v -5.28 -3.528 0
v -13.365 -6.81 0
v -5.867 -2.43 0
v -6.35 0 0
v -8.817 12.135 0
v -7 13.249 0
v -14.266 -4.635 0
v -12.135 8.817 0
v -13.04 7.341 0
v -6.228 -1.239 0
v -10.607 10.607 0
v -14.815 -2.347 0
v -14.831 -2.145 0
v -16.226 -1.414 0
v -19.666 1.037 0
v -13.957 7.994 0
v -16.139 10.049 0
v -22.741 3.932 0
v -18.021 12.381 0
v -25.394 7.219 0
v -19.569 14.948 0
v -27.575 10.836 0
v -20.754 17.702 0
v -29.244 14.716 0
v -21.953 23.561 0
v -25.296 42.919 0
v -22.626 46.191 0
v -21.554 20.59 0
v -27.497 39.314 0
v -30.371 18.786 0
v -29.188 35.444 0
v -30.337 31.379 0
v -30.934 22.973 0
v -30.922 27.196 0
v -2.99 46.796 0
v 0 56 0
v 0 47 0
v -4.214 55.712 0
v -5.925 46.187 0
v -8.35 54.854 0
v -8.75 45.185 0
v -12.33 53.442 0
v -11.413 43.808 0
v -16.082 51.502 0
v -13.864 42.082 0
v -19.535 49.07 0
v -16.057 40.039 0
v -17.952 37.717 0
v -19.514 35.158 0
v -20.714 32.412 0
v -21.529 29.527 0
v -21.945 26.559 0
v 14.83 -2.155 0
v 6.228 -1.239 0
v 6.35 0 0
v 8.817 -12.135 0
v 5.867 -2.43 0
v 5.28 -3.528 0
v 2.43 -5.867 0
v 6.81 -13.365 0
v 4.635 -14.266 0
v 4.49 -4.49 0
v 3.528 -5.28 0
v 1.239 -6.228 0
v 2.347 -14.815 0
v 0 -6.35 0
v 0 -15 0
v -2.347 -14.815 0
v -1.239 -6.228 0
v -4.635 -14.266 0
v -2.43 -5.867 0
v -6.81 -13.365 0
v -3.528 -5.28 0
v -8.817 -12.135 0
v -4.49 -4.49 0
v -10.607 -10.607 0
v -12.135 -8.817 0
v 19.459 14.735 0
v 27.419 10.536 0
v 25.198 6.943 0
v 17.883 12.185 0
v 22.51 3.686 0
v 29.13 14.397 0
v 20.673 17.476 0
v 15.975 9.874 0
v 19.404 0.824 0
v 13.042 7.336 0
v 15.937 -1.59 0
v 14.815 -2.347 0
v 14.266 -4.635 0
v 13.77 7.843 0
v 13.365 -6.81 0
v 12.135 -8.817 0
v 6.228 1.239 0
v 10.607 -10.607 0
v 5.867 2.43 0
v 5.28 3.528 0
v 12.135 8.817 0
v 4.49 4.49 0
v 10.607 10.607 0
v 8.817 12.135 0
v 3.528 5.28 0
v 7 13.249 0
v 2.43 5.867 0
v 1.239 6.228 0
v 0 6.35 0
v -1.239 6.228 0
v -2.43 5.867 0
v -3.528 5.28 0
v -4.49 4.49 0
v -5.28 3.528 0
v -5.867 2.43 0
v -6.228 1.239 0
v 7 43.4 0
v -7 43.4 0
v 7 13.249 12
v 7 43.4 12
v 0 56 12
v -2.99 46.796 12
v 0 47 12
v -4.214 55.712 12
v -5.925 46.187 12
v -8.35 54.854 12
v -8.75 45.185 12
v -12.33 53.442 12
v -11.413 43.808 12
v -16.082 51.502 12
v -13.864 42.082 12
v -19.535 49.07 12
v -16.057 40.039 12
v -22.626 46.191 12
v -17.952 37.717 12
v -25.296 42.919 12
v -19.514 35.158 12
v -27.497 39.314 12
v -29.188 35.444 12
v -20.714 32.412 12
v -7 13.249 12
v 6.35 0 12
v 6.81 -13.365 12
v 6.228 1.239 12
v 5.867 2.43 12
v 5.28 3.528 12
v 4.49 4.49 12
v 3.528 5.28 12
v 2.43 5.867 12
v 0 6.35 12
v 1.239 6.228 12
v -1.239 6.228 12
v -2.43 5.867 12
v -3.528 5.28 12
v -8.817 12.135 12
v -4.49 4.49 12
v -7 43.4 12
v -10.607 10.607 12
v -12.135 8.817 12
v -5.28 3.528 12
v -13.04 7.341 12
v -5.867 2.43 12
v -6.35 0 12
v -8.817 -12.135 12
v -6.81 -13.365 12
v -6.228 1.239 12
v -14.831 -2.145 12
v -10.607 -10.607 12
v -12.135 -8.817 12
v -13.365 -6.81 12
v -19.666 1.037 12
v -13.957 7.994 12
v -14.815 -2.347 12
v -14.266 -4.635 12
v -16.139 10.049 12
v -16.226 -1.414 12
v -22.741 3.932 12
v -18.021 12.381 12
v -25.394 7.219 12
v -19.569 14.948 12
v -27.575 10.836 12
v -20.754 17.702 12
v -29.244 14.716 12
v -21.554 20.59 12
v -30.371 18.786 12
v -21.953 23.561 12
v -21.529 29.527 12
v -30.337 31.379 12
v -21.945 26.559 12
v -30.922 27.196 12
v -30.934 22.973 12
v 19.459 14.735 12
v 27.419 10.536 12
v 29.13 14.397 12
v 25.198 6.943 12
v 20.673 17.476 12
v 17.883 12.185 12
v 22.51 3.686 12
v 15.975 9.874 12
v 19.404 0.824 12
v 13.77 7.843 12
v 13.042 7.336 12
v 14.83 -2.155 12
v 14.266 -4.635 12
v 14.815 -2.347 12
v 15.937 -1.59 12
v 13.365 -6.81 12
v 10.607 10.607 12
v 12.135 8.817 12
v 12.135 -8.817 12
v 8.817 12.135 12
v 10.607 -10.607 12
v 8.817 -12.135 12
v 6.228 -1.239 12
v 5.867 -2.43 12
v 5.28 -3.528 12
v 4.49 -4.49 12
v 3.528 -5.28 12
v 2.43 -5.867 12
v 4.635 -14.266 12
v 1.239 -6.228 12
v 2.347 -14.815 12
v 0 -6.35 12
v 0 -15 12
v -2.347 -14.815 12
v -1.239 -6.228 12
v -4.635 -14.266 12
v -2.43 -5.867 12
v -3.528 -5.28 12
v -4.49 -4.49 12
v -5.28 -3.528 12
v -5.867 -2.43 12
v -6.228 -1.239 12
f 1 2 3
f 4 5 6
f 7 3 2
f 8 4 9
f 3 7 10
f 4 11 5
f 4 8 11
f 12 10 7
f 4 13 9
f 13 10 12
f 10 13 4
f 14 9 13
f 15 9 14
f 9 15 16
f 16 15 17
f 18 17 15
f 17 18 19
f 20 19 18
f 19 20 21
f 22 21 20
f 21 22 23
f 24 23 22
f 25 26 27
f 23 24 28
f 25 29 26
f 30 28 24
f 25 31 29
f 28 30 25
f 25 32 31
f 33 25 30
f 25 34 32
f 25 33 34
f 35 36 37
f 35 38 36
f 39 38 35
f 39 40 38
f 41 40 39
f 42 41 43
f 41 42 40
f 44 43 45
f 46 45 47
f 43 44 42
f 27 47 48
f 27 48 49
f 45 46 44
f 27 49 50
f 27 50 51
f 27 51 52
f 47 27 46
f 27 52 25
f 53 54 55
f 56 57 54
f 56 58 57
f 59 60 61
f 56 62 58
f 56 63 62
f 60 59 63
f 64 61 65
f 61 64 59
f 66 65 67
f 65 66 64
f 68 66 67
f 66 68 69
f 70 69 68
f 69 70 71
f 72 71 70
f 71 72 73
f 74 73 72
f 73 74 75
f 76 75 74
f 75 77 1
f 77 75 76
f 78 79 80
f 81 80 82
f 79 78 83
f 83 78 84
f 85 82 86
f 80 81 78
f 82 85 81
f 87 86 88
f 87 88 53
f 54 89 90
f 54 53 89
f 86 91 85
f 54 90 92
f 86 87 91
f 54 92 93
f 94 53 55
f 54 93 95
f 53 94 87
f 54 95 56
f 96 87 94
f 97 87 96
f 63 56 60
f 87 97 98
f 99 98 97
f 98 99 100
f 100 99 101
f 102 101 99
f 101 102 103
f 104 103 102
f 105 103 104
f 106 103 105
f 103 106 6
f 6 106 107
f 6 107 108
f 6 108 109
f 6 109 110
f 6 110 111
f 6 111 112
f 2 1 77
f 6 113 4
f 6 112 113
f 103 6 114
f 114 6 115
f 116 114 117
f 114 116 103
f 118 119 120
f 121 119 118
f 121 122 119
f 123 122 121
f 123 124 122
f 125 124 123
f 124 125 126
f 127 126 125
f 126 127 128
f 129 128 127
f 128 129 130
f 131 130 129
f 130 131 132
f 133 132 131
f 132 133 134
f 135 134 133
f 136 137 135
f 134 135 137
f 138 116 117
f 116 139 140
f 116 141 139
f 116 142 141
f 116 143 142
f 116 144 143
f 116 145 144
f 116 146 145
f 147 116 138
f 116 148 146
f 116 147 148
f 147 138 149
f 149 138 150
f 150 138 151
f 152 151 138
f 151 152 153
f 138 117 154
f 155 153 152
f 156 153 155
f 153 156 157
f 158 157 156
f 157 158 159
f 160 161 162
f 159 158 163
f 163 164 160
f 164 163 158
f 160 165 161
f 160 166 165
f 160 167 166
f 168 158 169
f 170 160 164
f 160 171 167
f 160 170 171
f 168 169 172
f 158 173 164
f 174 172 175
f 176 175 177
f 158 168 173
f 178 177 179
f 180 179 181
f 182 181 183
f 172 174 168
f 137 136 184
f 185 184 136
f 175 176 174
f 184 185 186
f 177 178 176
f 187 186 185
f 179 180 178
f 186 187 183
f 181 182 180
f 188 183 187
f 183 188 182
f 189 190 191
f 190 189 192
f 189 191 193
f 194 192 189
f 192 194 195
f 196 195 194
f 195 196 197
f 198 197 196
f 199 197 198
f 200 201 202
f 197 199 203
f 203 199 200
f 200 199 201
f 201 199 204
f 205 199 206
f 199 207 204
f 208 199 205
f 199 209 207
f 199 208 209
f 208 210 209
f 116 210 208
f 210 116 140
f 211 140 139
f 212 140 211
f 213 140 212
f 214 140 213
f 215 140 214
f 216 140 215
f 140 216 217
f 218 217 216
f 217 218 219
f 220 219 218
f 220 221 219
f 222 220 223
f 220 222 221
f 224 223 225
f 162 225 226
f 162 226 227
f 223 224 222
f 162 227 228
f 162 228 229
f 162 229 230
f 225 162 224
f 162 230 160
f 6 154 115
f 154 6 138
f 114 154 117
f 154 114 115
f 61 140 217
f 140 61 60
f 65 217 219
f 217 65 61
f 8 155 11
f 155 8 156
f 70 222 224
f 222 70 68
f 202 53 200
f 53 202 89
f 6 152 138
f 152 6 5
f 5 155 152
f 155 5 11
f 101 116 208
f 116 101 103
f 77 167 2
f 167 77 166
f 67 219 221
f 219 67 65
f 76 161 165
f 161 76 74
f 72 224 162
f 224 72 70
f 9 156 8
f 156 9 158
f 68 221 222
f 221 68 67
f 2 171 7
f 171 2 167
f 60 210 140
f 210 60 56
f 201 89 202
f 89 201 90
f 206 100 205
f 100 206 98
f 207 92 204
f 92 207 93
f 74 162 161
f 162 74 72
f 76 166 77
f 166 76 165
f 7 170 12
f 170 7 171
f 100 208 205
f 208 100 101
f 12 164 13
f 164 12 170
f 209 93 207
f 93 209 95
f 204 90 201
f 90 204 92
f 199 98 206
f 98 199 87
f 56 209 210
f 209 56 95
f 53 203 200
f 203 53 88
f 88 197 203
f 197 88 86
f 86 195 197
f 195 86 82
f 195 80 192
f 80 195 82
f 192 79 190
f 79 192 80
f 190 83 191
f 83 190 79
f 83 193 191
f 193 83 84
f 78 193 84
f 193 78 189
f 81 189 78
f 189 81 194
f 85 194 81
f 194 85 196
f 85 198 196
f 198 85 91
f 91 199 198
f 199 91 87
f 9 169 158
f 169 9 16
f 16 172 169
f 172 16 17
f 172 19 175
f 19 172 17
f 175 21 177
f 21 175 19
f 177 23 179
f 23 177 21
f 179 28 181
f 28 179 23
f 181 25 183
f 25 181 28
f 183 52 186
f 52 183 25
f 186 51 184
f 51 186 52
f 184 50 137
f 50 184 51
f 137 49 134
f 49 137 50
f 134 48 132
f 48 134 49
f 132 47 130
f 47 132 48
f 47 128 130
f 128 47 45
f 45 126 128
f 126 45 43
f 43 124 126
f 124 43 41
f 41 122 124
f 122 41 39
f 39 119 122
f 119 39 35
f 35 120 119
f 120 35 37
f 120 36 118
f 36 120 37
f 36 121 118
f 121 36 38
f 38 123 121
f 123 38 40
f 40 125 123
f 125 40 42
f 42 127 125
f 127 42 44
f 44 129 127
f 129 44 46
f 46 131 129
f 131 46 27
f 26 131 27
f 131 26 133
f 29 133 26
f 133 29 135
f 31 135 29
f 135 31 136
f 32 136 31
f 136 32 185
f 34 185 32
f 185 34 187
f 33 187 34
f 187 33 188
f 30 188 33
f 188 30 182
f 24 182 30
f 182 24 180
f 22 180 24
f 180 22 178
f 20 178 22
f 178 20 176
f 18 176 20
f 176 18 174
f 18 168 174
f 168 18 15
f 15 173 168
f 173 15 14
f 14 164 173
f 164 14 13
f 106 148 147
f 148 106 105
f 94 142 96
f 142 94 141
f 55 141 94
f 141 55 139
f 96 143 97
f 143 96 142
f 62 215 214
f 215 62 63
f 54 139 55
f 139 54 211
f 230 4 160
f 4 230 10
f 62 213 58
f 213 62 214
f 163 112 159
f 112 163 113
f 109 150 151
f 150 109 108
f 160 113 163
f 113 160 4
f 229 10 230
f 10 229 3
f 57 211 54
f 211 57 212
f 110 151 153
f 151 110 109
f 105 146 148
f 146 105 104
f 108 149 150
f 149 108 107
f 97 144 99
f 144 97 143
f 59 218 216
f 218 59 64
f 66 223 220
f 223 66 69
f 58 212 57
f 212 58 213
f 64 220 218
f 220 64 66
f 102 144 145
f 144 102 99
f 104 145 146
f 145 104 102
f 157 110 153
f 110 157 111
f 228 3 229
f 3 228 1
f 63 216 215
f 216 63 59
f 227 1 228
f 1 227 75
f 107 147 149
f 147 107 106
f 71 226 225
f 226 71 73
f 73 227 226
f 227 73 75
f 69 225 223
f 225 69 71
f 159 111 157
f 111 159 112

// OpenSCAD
$fn = 32;

// ----------------------------------------------------------------------
// Hook: 50 mm shank into a 22 mm curl, 12 mm thick
// ----------------------------------------------------------------------

// --- parameters (mm) ---
shank_len = 50;           // shank length from the boss centre
shank_w = 14;             // shank width
boss_d = 30;              // boss diameter
bore_d = 12.7;            // boss bore
curl_in = 22;             // curl inner radius
curl_out = 31;            // curl outer radius
curl_sweep = 250;         // curl sweep angle
hook_t = 12;              // hook thickness

shank_profile = [[-7, 43.4], [7, 43.4], [7, 13], [-7, 13]];
boss_profile = [[15, 0], [14.815, 2.347], [14.266, 4.635], [13.365, 6.81], [12.135, 8.817], [10.607, 10.607], [8.817, 12.135], [6.81, 13.365], [4.635, 14.266], [2.347, 14.815], [0, 15], [-2.347, 14.815], [-4.635, 14.266], [-6.81, 13.365], [-8.817, 12.135], [-10.607, 10.607], [-12.135, 8.817], [-13.365, 6.81], [-14.266, 4.635], [-14.815, 2.347], [-15, 0], [-14.815, -2.347], [-14.266, -4.635], [-13.365, -6.81], [-12.135, -8.817], [-10.607, -10.607], [-8.817, -12.135], [-6.81, -13.365], [-4.635, -14.266], [-2.347, -14.815], [0, -15], [2.347, -14.815], [4.635, -14.266], [6.81, -13.365], [8.817, -12.135], [10.607, -10.607], [12.135, -8.817], [13.365, -6.81], [14.266, -4.635], [14.815, -2.347]];
curl_profile = [[0, 56], [-4.214, 55.712], [-8.35, 54.854], [-12.33, 53.442], [-16.082, 51.502], [-19.535, 49.07], [-22.626, 46.191], [-25.296, 42.919], [-27.497, 39.314], [-29.188, 35.444], [-30.337, 31.379], [-30.922, 27.196], [-30.934, 22.973], [-30.371, 18.786], [-29.244, 14.716], [-27.575, 10.836], [-25.394, 7.219], [-22.741, 3.932], [-19.666, 1.037], [-16.226, -1.414], [-12.485, -3.375], [-8.512, -4.808], [-4.381, -5.689], [-0.169, -6], [4.046, -5.735], [8.187, -4.899], [12.175, -3.509], [15.937, -1.59], [19.404, 0.824], [22.51, 3.686], [25.198, 6.943], [27.419, 10.536], [29.13, 14.397], [20.673, 17.476], [19.459, 14.735], [17.883, 12.185], [15.975, 9.874], [13.77, 7.843], [11.31, 6.13], [8.64, 4.768], [5.81, 3.781], [2.872, 3.188], [-0.12, 3], [-3.109, 3.221], [-6.041, 3.846], [-8.86, 4.863], [-11.515, 6.254], [-13.957, 7.994], [-16.139, 10.049], [-18.021, 12.381], [-19.569, 14.948], [-20.754, 17.702], [-21.554, 20.59], [-21.953, 23.561], [-21.945, 26.559], [-21.529, 29.527], [-20.714, 32.412], [-19.514, 35.158], [-17.952, 37.717], [-16.057, 40.039], [-13.864, 42.082], [-11.413, 43.808], [-8.75, 45.185], [-5.925, 46.187], [-2.99, 46.796], [0, 47]];

difference() {
  union() {
    /* three overlapping outlines: shank, boss and the smooth curl */
    linear_extrude(height = hook_t) polygon(shank_profile);
    linear_extrude(height = hook_t) polygon(boss_profile);
    linear_extrude(height = hook_t) polygon(curl_profile);
  }
  translate([0, 0, -2.5]) cylinder(h = hook_t + 5, d = bore_d);
}
